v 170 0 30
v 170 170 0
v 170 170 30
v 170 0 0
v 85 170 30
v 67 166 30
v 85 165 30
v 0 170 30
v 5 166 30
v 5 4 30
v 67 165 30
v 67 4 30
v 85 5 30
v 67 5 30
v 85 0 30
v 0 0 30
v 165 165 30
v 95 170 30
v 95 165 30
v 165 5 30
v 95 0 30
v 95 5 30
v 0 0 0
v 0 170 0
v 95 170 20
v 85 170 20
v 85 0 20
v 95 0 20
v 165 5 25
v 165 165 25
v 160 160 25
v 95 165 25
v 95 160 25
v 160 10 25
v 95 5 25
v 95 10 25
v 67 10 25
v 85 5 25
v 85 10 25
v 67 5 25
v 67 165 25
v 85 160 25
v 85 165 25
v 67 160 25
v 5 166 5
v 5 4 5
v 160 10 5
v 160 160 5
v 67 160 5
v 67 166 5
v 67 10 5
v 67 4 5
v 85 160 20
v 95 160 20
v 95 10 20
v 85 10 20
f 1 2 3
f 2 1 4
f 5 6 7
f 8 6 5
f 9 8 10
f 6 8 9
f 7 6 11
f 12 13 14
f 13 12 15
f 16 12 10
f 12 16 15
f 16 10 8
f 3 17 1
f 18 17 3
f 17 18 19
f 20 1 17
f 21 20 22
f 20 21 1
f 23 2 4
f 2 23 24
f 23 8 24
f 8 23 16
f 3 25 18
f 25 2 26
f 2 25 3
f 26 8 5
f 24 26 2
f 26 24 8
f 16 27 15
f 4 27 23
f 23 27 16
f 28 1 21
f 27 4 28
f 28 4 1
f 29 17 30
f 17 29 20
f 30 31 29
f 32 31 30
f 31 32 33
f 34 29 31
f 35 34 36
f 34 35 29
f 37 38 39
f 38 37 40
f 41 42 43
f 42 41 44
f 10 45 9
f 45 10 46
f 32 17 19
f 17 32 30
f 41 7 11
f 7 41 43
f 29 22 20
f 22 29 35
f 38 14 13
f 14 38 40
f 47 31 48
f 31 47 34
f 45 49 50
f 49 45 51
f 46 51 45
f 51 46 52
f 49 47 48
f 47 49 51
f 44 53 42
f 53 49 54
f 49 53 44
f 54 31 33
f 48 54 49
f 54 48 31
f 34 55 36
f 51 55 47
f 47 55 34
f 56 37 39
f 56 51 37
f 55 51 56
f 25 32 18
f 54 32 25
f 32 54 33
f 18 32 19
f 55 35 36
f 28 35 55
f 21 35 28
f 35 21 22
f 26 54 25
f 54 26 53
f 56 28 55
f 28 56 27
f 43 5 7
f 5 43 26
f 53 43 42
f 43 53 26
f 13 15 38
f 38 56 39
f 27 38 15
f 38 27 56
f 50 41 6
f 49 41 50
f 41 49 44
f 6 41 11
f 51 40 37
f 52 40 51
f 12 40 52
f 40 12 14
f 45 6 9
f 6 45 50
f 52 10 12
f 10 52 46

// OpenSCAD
board_size = 160;
outer_lip_width = 5;
inner_lip_width = 5;
board_height = 5;
total_height = 30;

difference() {
    cube([board_size+2*outer_lip_width,
            board_size+2*outer_lip_width,
            total_height]);
    translate([outer_lip_width,outer_lip_width,total_height-board_height])
    cube([board_size,board_size,board_height]);
    translate([outer_lip_width+inner_lip_width, outer_lip_width+inner_lip_width,5])
    cube([board_size-2*inner_lip_width, board_size-2*inner_lip_width, total_height-board_height]);
    translate([outer_lip_width+board_size/2,0,total_height-board_height-5])
    cube([10,board_size+2*outer_lip_width,board_height+5]);
    translate([5,4,5])
    cube([62,162,30]);
}
